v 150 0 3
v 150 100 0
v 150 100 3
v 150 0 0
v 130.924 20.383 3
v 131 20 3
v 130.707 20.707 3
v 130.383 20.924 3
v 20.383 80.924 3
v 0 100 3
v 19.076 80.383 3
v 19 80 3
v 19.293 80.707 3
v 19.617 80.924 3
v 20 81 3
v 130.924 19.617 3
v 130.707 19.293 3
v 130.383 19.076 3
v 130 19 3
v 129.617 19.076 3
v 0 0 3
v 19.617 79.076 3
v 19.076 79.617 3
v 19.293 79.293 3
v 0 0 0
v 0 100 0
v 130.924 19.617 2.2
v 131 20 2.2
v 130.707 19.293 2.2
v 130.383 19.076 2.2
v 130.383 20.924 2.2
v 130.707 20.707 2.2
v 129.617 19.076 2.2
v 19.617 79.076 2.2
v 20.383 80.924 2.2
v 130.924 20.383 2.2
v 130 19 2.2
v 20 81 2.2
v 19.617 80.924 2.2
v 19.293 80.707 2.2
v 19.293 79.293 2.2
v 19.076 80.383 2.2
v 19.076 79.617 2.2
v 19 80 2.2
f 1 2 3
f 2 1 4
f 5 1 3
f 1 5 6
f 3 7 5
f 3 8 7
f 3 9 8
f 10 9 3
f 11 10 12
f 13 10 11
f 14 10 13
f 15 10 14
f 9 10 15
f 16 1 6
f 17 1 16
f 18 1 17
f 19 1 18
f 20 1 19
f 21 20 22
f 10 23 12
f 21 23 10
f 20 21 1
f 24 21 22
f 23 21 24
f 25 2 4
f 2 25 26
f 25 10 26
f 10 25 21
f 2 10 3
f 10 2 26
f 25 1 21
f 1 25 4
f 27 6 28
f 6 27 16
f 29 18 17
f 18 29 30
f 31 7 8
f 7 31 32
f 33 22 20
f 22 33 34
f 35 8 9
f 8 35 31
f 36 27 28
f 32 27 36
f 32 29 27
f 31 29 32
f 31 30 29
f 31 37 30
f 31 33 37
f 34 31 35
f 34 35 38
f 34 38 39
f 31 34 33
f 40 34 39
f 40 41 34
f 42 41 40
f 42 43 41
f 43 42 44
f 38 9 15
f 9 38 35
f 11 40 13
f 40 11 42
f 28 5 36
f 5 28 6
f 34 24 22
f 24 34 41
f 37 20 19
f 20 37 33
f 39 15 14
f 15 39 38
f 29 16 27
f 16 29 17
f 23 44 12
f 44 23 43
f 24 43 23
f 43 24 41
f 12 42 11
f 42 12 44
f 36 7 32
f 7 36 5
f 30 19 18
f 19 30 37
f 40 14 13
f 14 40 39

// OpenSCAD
/*
Title: DC Motor Torque-Speed Concept Board
Folder: 18_advanced_electromechanics
Physics Topic: Advanced: motor torque-speed relationship
Difficulty: Advanced
Print Type: FDM, single material
Teaches: Why increasing speed reduces available torque in a DC motor model
Use Case: Classroom manipulative
*/


// --------------------
// Parameters
// --------------------
board_w = 150;
board_h = 100;
thickness = 3;

module motor_concept_board(){
    difference(){
        cube([board_w,board_h,thickness]);
        // linear torque-speed line groove
        hull(){
            translate([20,80,thickness-0.8]) cylinder(h=1,d=2,$fn=16);
            translate([130,20,thickness-0.8]) cylinder(h=1,d=2,$fn=16);
        }
    }
}
motor_concept_board();
